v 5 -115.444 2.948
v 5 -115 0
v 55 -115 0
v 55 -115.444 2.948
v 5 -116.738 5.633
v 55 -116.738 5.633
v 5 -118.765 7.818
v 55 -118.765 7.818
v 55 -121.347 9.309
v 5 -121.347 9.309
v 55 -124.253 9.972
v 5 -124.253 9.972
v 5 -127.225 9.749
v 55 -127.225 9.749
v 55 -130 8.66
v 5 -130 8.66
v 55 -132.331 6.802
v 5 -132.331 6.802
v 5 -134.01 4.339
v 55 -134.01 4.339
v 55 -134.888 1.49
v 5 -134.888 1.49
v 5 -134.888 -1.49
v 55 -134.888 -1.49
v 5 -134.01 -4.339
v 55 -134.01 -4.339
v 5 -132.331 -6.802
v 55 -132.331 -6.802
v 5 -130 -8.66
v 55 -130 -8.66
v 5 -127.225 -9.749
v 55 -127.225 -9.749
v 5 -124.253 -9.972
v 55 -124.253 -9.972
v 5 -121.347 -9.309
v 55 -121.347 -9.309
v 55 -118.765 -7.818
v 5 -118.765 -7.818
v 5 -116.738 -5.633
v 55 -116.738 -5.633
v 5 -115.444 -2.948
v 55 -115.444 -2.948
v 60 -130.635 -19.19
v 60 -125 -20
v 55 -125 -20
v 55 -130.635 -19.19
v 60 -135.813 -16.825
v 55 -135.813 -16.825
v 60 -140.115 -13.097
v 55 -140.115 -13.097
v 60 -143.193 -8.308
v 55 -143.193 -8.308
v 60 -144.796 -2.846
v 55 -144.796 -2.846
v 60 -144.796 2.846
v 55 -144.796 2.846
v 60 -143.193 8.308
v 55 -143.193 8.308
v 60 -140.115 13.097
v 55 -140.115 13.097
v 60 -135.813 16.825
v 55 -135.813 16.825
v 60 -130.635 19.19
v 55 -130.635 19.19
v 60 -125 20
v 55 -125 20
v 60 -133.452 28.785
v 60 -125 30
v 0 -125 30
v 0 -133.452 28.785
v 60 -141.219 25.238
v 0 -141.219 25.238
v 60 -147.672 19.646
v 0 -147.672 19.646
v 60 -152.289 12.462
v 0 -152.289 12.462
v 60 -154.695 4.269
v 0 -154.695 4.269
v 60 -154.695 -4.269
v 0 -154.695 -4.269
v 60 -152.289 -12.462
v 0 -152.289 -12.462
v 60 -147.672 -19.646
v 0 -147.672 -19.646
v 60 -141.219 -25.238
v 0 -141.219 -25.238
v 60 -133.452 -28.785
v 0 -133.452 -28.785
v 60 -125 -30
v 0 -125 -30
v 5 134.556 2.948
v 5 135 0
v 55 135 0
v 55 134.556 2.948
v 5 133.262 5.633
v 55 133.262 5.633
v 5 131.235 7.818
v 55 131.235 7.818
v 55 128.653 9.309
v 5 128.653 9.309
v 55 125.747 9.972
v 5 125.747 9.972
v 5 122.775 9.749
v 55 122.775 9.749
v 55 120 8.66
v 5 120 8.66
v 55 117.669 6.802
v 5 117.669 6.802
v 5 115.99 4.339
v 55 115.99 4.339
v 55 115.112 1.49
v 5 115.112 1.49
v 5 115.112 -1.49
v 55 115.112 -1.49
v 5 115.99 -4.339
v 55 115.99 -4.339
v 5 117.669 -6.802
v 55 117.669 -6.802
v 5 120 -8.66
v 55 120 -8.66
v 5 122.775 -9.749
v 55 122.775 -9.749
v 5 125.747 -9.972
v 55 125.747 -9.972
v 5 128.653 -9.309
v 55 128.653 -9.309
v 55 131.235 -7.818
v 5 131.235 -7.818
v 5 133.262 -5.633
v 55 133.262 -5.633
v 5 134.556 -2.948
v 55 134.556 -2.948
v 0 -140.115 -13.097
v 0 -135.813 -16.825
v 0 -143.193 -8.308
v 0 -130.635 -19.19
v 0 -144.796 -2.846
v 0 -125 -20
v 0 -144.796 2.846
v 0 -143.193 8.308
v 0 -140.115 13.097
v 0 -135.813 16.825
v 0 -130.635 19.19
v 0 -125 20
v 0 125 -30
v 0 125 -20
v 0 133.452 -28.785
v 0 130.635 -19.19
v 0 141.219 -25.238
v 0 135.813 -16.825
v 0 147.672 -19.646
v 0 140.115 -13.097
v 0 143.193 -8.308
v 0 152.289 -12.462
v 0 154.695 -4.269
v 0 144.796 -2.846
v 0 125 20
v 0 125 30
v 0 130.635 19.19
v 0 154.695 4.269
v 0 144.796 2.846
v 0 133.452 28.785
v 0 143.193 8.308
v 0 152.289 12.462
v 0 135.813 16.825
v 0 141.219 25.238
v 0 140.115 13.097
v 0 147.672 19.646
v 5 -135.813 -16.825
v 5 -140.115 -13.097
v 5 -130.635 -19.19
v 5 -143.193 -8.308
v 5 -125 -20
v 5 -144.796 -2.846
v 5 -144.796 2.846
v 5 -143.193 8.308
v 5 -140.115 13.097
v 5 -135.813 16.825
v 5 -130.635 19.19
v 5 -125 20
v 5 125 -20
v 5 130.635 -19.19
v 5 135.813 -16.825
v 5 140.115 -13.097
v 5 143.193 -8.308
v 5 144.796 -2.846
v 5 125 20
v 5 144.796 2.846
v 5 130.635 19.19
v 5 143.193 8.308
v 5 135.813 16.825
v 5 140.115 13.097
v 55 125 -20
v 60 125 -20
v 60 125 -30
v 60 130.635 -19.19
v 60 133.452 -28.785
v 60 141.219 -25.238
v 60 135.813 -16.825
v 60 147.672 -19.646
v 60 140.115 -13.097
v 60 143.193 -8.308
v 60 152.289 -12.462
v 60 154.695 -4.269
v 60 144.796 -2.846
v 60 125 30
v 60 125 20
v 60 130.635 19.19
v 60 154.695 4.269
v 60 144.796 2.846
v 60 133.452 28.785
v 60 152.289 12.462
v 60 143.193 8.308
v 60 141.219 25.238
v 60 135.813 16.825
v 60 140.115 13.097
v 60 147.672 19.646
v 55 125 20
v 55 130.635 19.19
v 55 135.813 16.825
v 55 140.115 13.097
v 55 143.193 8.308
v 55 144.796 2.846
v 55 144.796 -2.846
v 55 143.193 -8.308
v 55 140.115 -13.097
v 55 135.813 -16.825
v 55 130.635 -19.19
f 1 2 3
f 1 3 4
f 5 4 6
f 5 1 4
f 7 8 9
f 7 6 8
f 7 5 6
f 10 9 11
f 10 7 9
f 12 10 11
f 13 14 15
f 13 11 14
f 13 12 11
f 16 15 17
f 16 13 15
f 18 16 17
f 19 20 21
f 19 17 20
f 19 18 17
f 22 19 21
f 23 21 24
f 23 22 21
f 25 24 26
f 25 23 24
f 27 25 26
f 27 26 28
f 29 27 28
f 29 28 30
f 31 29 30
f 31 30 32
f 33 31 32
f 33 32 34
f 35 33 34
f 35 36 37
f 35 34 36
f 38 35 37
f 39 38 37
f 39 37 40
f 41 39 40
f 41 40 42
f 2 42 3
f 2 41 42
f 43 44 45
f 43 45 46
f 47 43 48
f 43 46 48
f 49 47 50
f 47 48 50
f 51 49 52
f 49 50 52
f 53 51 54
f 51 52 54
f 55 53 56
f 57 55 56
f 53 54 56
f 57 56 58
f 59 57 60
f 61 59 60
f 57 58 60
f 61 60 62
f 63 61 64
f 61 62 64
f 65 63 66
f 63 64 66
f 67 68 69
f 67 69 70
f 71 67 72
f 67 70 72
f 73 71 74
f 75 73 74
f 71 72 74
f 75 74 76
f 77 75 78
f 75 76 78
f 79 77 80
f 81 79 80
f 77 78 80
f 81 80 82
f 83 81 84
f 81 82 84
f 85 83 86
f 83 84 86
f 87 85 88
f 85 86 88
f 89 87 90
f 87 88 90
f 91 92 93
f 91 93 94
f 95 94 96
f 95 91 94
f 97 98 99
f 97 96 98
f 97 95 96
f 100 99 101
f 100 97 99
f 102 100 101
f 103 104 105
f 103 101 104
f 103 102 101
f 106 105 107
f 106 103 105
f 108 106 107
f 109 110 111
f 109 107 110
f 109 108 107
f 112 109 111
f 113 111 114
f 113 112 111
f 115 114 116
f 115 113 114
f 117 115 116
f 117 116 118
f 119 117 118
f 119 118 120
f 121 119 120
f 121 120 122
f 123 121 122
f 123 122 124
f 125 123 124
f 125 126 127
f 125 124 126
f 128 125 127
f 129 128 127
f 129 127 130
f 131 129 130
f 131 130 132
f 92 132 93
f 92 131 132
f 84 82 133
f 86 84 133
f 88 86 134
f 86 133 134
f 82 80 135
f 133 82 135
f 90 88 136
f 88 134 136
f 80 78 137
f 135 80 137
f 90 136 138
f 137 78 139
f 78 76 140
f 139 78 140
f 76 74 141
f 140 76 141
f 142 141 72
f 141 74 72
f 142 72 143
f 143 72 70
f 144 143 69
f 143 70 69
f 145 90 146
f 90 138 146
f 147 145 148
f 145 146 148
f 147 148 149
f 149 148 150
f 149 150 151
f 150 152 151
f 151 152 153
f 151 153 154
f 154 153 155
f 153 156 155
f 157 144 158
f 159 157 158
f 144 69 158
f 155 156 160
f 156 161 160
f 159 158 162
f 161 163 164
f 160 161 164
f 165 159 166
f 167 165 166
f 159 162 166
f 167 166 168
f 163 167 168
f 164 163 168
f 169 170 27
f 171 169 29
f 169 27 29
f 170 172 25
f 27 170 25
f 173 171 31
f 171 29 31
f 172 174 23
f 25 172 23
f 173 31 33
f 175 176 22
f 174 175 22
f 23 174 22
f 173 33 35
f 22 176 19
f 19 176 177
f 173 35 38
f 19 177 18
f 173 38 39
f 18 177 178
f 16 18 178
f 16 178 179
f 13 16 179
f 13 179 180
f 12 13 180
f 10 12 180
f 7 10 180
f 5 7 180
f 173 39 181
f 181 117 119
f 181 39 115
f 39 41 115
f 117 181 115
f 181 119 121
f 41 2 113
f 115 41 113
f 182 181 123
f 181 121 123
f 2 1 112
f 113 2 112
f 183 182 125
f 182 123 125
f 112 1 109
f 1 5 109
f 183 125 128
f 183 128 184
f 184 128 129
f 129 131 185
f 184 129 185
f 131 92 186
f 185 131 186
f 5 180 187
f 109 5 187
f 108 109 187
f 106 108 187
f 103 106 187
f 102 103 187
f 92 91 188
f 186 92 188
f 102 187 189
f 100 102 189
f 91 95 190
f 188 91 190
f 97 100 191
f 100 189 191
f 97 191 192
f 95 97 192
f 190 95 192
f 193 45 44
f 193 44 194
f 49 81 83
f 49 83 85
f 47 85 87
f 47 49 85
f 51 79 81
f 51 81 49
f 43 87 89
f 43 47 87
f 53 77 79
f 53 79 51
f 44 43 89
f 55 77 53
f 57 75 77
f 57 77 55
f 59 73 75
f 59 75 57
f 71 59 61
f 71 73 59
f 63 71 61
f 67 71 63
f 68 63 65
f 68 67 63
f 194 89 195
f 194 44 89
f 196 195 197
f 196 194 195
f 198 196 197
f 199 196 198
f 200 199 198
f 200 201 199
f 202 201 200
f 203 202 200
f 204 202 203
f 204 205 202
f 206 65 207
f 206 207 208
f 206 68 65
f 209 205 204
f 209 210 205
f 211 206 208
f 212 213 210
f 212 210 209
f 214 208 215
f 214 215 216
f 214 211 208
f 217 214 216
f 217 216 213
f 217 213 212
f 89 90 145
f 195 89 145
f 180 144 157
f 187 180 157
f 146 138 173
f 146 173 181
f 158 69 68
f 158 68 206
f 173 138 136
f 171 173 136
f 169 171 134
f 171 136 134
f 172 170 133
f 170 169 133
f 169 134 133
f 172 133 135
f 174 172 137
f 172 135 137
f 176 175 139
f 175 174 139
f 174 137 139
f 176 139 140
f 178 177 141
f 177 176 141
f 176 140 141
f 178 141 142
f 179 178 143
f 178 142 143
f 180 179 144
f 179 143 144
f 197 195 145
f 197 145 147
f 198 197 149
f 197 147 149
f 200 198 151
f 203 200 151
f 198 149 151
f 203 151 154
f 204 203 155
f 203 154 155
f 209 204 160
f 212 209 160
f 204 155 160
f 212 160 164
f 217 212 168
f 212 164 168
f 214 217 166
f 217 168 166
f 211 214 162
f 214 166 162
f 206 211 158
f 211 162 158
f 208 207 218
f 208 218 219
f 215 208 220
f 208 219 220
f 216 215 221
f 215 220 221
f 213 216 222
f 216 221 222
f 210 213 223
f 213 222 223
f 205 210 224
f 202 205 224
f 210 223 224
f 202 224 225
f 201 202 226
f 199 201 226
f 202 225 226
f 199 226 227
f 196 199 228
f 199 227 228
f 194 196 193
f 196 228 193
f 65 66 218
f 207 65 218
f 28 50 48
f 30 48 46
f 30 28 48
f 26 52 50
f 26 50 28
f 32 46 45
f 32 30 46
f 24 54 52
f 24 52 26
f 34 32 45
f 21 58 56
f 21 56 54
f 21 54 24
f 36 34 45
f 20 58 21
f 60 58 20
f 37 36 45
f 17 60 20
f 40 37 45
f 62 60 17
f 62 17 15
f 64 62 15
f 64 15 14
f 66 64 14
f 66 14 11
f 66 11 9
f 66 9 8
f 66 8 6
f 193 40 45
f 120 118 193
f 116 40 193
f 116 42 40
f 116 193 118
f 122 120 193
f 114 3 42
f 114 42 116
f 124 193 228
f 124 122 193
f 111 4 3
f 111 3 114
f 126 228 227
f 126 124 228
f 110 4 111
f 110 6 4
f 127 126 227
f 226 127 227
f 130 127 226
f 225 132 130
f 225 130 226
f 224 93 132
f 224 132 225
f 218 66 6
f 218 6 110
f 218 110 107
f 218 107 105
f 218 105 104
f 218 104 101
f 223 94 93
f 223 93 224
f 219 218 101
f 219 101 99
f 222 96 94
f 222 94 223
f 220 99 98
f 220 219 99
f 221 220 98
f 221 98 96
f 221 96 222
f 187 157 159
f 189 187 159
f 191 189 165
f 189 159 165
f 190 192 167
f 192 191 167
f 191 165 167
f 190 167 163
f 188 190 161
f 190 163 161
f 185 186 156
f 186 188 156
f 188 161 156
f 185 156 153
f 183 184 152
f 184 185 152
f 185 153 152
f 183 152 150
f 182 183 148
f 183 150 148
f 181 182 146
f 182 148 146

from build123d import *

# Parameters (mm, degrees)
F0_W     = 250
F0_H     = 10
F1_DEPTH = 60
F2_START = 5
F0_H_2   = 40
F2_DEPTH = 50
F3_R     = 10
F4_DEPTH = 60.001


with BuildPart() as f1:
    # F0 (on Right) → F1 (new body)
    with BuildSketch(Plane.YZ):
        with Locations((0, 25)):
            Rectangle(F0_W, F0_H)
        with BuildLine():
            Line((-125, 20), (-125, 30))
            ThreePointArc((-125, 30), (-155, 0), (-125, -30))
            Line((-125, -30), (-125, -20))
            ThreePointArc((-125, -20), (-145, 0), (-125, 20))
        make_face()
        with BuildLine():
            ThreePointArc((125, -30), (155, 0), (125, 30))
            Line((125, 30), (125, 20))
            ThreePointArc((125, 20), (145, 0), (125, -20))
            Line((125, -20), (125, -30))
        make_face()
        with Locations((0, -25)):
            Rectangle(F0_W, F0_H)
    extrude(amount=F1_DEPTH)

    # F0 (on Right) → F2 (join)
    with BuildSketch(Plane.YZ.offset(F2_START)):
        Rectangle(F0_W, F0_H_2)
        with BuildLine():
            ThreePointArc((125, -20), (145, 0), (125, 20))
            Line((125, 20), (125, -20))
        make_face()
        with BuildLine():
            Line((-125, -20), (-125, 20))
            ThreePointArc((-125, 20), (-145, 0), (-125, -20))
        make_face()
    extrude(amount=F2_DEPTH)

    # F3 (on Right) → F4 (cut, through all)
    with BuildSketch(Plane.YZ):
        with Locations((-125, 0)):
            Circle(F3_R)
        with Locations((125, 0)):
            Circle(F3_R)
    extrude(amount=F4_DEPTH, mode=Mode.SUBTRACT)


solid = f1.part
